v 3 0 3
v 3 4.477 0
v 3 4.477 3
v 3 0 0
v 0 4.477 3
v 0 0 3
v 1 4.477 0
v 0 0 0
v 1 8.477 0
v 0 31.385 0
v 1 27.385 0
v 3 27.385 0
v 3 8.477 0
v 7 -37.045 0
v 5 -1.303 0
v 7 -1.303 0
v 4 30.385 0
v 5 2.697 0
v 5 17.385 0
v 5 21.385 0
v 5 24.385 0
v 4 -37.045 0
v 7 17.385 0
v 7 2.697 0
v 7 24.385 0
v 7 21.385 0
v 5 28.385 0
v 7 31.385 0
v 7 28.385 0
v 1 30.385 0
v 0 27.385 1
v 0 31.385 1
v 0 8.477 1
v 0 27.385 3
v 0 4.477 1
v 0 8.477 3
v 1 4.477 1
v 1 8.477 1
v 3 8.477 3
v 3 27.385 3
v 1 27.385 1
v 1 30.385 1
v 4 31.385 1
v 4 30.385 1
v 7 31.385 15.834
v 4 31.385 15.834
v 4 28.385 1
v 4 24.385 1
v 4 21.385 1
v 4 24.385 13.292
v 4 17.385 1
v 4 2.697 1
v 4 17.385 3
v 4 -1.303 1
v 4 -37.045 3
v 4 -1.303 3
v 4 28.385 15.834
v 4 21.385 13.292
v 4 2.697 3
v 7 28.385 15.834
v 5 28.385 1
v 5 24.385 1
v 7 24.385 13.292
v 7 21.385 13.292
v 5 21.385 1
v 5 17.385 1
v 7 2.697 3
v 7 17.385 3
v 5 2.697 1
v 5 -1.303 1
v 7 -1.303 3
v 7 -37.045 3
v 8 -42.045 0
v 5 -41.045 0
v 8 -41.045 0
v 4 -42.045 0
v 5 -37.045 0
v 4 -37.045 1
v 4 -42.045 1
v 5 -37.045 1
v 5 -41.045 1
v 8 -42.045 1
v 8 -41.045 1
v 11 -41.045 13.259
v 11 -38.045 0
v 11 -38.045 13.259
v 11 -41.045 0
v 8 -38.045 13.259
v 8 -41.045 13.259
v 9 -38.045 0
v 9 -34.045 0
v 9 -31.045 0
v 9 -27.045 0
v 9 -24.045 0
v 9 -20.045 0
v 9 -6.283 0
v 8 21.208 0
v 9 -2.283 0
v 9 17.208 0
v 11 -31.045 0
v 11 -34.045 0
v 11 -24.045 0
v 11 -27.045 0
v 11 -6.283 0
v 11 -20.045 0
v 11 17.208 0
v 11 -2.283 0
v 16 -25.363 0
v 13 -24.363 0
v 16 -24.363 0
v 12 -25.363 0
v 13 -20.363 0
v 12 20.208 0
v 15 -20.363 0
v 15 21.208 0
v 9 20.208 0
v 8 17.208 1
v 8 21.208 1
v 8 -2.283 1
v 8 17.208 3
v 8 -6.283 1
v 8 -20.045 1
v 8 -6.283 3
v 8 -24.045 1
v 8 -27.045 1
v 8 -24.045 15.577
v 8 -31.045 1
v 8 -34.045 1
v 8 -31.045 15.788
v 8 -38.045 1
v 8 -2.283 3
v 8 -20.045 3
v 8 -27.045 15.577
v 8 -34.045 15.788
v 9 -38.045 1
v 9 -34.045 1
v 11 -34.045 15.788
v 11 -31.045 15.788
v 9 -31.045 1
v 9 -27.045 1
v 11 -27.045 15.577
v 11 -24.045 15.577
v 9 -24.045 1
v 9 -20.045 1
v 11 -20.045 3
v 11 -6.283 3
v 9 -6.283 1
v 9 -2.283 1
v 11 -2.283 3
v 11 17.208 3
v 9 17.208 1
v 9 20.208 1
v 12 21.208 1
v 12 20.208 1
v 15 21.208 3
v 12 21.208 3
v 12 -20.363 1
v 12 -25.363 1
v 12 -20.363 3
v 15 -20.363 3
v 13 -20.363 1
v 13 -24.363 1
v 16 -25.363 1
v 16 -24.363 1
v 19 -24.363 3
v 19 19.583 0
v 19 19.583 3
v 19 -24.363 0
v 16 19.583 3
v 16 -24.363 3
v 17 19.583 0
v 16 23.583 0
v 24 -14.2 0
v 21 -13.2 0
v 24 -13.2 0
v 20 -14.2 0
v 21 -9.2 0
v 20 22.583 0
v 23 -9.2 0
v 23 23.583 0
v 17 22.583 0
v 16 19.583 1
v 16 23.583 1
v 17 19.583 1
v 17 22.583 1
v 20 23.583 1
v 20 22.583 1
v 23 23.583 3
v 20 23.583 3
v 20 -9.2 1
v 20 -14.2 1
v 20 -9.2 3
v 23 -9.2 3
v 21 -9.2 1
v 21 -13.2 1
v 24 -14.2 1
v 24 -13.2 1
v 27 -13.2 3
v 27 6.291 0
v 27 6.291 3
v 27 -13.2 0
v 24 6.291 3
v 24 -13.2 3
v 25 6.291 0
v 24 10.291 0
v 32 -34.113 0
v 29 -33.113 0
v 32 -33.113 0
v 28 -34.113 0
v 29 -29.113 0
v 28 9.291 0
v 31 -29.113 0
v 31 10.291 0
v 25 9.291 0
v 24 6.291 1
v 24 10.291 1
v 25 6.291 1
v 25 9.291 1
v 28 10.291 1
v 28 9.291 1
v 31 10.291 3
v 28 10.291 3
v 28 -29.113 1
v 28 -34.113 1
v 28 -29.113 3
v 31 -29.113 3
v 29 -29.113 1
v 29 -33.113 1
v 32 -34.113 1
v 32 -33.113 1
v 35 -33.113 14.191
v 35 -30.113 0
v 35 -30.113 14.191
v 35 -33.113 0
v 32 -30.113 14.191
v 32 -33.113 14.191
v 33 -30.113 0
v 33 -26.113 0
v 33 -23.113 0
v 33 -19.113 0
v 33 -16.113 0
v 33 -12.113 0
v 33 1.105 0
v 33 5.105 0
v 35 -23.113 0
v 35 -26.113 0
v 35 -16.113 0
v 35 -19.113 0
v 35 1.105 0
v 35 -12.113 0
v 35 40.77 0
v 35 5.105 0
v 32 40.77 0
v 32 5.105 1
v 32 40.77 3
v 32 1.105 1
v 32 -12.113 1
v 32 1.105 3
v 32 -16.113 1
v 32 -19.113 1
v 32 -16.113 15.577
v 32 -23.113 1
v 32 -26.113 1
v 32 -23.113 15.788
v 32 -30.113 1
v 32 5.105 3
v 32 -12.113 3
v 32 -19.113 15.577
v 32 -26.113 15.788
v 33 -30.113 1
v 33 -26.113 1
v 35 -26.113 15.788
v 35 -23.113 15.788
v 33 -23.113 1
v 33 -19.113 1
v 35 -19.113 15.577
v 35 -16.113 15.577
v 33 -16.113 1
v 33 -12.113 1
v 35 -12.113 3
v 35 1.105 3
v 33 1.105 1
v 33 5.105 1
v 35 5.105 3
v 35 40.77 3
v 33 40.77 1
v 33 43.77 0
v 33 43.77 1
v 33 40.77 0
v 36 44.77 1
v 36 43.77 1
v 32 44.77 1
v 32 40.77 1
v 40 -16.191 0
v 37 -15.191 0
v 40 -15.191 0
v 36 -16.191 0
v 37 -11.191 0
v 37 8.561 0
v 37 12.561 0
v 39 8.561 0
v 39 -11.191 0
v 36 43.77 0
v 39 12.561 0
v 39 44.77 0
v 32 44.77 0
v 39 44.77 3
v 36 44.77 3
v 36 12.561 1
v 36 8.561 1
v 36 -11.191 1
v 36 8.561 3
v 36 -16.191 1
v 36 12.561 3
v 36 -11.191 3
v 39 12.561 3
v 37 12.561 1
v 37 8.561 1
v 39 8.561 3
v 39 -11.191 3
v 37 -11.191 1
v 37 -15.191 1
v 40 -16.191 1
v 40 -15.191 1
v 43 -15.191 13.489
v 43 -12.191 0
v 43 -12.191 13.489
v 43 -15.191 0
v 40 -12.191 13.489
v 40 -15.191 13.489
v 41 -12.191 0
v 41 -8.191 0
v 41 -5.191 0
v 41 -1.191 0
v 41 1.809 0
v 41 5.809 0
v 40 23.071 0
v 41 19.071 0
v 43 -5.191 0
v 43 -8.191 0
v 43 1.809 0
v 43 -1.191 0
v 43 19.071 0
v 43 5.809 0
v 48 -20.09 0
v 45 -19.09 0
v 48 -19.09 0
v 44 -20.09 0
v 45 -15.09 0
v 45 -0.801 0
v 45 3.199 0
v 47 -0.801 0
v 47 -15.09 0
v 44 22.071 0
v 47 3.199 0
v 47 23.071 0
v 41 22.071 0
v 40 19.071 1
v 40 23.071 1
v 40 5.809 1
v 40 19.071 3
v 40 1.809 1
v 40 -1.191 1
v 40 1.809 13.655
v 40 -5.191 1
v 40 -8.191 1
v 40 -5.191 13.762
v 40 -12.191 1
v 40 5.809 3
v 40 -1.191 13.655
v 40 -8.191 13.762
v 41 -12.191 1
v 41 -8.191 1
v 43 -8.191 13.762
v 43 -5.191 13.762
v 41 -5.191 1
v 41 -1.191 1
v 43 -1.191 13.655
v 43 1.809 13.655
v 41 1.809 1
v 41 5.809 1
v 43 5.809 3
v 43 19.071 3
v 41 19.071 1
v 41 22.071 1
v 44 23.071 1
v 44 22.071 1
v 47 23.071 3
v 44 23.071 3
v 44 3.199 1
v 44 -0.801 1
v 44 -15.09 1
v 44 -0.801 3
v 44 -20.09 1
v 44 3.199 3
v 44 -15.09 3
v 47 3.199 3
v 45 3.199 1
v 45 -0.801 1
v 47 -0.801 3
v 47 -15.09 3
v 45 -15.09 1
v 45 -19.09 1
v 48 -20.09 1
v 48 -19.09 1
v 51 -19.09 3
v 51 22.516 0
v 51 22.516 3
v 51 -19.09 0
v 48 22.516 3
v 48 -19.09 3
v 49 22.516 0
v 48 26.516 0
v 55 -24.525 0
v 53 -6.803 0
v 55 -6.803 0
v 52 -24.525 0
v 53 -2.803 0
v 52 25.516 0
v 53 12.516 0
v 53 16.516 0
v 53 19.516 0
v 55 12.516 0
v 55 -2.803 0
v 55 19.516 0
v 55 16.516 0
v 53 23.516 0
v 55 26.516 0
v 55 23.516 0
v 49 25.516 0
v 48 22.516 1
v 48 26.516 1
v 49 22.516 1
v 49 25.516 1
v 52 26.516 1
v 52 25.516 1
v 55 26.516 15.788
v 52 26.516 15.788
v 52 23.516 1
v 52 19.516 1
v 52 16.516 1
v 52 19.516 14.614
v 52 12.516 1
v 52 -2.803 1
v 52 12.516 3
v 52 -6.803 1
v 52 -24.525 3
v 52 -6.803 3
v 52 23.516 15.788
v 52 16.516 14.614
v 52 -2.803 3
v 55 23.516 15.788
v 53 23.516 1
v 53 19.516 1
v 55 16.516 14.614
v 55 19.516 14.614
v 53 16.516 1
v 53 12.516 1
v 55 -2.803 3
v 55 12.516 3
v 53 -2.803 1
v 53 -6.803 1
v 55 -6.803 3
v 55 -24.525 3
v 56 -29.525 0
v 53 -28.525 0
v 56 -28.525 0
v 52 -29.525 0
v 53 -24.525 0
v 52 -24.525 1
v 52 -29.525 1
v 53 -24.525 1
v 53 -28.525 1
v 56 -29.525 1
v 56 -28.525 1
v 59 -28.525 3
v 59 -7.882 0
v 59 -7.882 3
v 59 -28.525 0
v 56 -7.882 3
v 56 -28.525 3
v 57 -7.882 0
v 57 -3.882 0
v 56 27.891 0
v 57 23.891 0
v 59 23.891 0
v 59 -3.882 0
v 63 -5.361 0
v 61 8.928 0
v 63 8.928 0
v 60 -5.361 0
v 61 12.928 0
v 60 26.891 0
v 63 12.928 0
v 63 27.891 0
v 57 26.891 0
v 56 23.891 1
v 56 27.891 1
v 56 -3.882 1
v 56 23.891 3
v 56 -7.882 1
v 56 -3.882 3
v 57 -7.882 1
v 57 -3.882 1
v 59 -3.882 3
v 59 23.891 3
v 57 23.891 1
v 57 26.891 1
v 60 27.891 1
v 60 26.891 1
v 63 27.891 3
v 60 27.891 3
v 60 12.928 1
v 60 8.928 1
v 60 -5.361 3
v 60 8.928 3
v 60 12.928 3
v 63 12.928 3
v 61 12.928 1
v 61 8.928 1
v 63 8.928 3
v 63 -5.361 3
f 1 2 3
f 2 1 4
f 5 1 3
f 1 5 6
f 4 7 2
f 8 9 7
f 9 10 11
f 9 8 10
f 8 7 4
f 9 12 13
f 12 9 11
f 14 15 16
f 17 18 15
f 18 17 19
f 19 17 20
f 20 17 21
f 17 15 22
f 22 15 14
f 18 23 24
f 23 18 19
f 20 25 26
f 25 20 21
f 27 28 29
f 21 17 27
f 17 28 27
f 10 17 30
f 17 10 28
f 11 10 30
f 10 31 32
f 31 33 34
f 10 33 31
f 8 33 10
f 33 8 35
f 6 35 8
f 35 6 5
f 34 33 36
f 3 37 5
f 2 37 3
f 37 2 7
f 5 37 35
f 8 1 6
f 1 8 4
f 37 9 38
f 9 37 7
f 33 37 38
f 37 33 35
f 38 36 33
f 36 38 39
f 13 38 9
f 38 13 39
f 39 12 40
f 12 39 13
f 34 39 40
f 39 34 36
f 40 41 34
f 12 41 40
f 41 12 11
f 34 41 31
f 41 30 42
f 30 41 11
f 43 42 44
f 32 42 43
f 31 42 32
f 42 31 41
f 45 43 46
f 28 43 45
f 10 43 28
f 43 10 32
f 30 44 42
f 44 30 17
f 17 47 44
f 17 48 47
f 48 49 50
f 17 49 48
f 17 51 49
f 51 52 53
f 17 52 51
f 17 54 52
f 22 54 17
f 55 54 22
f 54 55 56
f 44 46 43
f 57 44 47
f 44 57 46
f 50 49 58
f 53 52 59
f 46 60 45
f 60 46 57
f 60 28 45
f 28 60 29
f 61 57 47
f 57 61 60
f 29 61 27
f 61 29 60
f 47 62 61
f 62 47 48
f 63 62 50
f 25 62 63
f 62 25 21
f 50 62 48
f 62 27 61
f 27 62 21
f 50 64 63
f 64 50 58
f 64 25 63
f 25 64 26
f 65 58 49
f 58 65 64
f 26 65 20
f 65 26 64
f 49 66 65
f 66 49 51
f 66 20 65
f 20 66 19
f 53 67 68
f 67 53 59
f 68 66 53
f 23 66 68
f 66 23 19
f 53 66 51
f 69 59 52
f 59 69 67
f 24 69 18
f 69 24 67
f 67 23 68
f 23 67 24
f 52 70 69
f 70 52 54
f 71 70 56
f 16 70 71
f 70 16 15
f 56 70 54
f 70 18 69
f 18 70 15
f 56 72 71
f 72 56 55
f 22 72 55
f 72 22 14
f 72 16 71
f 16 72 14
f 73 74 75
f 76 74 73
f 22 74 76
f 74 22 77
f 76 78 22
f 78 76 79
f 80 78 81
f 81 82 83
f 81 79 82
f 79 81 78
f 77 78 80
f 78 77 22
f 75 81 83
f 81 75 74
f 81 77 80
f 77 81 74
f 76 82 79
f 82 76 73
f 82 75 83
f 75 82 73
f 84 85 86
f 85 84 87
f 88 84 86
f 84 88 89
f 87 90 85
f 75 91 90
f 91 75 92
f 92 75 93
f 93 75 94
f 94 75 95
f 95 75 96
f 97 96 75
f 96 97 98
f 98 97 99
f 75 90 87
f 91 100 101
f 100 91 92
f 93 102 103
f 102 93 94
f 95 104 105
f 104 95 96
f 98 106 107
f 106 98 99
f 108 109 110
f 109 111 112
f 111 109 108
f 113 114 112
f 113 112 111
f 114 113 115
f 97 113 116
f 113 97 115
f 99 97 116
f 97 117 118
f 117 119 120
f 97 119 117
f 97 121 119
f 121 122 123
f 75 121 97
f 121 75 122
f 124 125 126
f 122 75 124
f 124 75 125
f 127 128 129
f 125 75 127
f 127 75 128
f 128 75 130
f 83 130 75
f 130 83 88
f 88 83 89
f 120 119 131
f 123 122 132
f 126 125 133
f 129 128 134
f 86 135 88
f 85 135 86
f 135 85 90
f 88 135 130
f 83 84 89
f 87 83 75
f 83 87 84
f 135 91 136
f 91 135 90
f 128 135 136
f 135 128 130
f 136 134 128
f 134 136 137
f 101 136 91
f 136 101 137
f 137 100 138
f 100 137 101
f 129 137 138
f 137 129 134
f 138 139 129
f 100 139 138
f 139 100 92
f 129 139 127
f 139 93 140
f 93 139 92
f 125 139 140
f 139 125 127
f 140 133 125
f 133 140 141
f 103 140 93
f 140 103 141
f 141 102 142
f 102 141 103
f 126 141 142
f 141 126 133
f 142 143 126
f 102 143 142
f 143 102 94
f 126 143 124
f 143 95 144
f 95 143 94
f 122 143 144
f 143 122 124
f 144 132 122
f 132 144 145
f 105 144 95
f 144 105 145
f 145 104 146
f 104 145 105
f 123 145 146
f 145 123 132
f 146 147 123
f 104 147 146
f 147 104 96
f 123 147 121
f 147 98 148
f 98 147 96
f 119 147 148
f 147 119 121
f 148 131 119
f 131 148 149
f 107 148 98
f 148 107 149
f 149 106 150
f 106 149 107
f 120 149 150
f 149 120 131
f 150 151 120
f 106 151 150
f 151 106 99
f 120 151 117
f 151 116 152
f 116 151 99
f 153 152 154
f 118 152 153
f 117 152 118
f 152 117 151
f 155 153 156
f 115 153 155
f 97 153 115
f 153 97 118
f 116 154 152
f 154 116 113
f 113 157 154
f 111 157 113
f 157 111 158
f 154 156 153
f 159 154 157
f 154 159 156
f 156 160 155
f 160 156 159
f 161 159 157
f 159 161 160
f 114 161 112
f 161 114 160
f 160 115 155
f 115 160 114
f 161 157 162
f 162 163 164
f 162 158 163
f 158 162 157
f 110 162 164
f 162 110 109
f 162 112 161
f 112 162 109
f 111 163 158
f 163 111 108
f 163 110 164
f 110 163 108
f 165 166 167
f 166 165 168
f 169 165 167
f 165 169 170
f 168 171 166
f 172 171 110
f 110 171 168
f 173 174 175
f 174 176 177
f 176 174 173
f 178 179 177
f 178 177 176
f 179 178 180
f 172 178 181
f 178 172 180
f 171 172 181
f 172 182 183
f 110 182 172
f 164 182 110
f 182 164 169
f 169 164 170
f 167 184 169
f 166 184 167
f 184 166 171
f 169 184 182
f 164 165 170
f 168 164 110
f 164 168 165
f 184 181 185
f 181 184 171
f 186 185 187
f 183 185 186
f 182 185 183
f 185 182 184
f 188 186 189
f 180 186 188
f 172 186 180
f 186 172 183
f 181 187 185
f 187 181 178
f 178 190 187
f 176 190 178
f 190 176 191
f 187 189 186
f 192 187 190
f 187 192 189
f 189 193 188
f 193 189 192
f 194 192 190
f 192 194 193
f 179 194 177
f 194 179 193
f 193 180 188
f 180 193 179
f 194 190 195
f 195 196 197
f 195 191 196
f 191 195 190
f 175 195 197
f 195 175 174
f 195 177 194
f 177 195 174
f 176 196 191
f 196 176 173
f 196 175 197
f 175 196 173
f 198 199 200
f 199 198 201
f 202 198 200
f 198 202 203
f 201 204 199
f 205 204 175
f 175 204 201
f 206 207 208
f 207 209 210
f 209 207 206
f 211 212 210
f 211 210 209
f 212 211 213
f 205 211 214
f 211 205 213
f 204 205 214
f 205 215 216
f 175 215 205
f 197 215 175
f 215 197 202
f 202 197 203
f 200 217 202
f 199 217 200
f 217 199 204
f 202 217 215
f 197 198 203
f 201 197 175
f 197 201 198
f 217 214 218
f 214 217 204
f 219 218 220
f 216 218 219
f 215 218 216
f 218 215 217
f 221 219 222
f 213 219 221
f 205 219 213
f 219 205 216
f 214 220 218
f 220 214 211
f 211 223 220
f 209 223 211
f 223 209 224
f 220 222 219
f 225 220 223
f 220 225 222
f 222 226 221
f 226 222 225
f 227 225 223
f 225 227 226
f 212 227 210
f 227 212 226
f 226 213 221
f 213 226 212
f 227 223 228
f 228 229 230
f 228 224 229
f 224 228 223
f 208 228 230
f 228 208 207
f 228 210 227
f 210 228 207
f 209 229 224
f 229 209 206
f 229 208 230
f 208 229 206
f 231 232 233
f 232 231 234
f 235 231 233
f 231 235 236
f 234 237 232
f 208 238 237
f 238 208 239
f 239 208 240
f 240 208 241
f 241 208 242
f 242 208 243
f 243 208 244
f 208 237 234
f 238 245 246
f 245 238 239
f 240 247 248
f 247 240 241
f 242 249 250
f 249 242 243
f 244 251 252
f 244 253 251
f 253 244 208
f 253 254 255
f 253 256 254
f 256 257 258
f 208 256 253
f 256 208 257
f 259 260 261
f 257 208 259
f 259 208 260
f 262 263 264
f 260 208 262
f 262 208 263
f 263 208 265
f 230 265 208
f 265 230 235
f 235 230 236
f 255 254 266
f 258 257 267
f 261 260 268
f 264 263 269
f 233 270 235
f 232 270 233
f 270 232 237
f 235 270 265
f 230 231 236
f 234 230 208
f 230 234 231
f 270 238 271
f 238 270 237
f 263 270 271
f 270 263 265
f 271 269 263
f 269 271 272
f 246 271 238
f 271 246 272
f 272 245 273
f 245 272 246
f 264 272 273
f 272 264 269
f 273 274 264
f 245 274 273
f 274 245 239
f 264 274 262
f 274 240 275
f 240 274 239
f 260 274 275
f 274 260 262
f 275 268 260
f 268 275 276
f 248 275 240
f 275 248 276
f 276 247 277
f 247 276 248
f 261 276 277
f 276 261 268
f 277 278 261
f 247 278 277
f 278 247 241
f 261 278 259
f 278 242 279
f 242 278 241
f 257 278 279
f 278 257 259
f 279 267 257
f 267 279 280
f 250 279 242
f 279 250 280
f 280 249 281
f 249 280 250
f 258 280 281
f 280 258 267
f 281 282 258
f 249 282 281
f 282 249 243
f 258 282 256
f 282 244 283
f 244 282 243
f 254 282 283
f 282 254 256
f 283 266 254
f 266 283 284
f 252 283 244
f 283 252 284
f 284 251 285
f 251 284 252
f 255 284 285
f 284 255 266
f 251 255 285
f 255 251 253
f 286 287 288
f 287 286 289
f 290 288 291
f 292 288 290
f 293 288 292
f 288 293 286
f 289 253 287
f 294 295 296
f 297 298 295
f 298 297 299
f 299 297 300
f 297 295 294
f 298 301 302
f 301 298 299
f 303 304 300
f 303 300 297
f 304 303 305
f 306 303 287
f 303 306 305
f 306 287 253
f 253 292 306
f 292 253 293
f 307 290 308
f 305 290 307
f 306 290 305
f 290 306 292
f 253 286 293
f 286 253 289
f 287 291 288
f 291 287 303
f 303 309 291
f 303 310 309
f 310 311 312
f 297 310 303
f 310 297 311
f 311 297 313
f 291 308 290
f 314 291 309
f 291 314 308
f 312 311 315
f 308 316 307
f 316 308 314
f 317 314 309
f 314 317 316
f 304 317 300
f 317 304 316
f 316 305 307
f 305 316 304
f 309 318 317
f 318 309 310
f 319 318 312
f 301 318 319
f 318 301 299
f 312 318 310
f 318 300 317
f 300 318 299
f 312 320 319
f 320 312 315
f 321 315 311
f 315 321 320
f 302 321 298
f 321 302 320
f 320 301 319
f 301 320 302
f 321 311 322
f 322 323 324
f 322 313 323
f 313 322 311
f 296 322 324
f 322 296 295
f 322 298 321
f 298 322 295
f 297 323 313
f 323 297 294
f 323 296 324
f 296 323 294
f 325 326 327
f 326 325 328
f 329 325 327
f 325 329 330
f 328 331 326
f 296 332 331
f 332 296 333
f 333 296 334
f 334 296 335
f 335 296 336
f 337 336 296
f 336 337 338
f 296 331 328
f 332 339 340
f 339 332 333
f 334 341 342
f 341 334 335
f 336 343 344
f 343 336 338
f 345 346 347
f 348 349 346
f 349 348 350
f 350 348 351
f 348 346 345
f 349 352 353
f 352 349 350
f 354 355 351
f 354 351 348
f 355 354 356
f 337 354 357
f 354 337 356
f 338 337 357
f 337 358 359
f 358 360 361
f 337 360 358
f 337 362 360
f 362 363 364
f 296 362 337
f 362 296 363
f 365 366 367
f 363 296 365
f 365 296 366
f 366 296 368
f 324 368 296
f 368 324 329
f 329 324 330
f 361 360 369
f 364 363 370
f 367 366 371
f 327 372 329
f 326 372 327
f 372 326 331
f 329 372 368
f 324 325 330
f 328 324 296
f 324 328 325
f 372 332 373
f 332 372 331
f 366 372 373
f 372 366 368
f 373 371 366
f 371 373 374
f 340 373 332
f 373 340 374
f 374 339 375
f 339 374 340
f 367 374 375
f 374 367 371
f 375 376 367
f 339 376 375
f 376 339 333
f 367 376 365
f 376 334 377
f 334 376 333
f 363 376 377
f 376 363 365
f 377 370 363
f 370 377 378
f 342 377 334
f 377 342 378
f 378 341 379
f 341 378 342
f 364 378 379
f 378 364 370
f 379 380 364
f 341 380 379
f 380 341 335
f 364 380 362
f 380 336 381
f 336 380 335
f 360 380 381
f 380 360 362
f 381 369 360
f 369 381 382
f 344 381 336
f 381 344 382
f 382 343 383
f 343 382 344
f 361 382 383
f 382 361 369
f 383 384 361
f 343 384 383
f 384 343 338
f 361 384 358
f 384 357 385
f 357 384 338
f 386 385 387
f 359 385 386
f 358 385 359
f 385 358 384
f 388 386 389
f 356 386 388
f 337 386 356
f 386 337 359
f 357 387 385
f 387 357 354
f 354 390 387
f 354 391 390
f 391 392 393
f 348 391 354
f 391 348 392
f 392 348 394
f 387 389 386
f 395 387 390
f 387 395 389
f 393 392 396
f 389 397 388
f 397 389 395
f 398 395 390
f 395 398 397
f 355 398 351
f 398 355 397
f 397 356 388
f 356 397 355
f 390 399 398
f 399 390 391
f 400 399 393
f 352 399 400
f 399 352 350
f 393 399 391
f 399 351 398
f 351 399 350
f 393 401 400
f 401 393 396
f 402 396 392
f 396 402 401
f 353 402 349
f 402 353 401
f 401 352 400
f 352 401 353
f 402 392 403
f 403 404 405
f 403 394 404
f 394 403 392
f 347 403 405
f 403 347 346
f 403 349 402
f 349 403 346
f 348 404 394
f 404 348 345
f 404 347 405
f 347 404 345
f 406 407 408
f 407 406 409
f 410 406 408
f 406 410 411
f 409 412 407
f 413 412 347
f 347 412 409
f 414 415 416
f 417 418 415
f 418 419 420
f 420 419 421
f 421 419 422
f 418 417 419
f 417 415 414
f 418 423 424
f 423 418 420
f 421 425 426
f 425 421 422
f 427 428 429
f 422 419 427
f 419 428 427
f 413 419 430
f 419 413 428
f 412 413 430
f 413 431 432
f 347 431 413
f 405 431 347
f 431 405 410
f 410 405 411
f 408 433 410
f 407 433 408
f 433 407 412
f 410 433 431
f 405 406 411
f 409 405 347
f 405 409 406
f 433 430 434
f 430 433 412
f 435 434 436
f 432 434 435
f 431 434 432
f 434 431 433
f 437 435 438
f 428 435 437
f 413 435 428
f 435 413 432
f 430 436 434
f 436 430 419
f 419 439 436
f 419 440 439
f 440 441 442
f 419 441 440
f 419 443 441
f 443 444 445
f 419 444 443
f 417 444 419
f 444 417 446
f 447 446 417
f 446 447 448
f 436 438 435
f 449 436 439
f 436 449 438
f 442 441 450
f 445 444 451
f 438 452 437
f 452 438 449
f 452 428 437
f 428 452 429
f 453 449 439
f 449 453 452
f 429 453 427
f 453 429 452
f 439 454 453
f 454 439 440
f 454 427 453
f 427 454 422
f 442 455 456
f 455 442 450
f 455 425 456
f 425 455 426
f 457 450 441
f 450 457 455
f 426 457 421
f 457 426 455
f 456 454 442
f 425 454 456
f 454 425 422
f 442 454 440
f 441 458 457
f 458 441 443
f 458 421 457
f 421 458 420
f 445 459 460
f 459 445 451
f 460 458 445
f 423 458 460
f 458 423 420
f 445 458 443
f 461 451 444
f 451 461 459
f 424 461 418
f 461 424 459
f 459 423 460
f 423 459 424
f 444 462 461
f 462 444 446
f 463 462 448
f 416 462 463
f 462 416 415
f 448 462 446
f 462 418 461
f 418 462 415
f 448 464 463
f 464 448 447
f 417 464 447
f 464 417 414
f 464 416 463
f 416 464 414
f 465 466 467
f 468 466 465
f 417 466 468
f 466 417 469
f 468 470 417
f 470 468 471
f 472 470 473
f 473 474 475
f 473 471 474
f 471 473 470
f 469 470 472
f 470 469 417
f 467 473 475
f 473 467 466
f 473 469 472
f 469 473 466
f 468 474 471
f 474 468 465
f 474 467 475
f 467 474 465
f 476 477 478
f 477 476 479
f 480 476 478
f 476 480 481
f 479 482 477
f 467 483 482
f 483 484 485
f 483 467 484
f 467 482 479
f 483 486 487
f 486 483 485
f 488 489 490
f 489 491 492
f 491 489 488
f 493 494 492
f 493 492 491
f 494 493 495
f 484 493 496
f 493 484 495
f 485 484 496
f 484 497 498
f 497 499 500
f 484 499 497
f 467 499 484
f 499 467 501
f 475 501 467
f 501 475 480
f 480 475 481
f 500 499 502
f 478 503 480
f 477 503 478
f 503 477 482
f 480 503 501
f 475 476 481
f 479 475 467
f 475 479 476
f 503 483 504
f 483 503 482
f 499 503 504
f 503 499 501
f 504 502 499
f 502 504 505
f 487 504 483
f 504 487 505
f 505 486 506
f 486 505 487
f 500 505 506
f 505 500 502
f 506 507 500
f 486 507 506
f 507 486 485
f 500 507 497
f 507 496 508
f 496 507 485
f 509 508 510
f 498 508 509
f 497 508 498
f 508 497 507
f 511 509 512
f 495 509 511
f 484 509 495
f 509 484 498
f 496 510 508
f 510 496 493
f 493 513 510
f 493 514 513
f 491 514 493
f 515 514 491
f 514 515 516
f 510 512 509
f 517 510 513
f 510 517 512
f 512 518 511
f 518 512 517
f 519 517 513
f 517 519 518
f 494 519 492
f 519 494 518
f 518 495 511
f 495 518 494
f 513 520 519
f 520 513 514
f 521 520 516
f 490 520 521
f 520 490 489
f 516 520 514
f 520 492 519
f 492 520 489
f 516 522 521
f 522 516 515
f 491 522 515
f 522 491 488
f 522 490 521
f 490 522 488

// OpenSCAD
translate([0.000000, 0.000000, 0]) rotate([0,0.000000,0]) cube([3.000000, 4.477220, 3.000000]);translate([0.000000, 4.477220, 0]) rotate([0,0,0]) cube([1.000000, 4.000000, 1.000000]);translate([0.000000, 8.477220, 0]) rotate([0,0.000000,0]) cube([3.000000, 18.907636, 3.000000]);translate([0.000000, 27.384856, 0]) rotate([0,0,0]) cube([1.000000, 4.000000, 1.000000]);translate([0.000000, 31.384856, 0]) rotate([0,0,-90]) cube([1.000000, 4.000000, 1.000000]);translate([7.000000, 31.384856, 0.000000]) rotate([180, 180.000000 ,0]) cube([3.000000, 3.000000, 15.833687]);translate([0.000000, 27.384856, 0]) rotate([0,0,0]) cube([1.000000, 4.000000, 1.000000]);translate([4.000000, 28.384856, 1.000000]) rotate([180, 0, 0]) cube([1.000000, 4.000000, 1.000000]);translate([7.000000, 24.384856, 0.000000]) rotate([180, 180.000000 ,0]) cube([3.000000, 3.000000, 13.291805]);translate([0.000000, 27.384856, 0]) rotate([0,0,0]) cube([1.000000, 4.000000, 1.000000]);translate([4.000000, 28.384856, 1.000000]) rotate([180, 0, 0]) cube([1.000000, 4.000000, 1.000000]);translate([4.000000, 21.384856, 1.000000]) rotate([180, 0, 0]) cube([1.000000, 4.000000, 1.000000]);translate([4.000000, 17.384856, 3.000000]) rotate([180, 0.000000 ,0]) cube([3.000000, 14.688103, 3.000000]);translate([0.000000, 27.384856, 0]) rotate([0,0,0]) cube([1.000000, 4.000000, 1.000000]);translate([4.000000, 28.384856, 1.000000]) rotate([180, 0, 0]) cube([1.000000, 4.000000, 1.000000]);translate([4.000000, 21.384856, 1.000000]) rotate([180, 0, 0]) cube([1.000000, 4.000000, 1.000000]);translate([4.000000, 2.696753, 1.000000]) rotate([180, 0, 0]) cube([1.000000, 4.000000, 1.000000]);translate([4.000000, -1.303247, 3.000000]) rotate([180, 0.000000 ,0]) cube([3.000000, 35.741387, 3.000000]);translate([0.000000, 27.384856, 0]) rotate([0,0,0]) cube([1.000000, 4.000000, 1.000000]);translate([4.000000, 28.384856, 1.000000]) rotate([180, 0, 0]) cube([1.000000, 4.000000, 1.000000]);translate([4.000000, 21.384856, 1.000000]) rotate([180, 0, 0]) cube([1.000000, 4.000000, 1.000000]);translate([4.000000, 2.696753, 1.000000]) rotate([180, 0, 0]) cube([1.000000, 4.000000, 1.000000]);translate([4.000000, -37.044635, 1.000000]) rotate([180, 0, 0]) cube([1.000000, 4.000000, 1.000000]);translate([4.000000, -41.044635, 0]) rotate([0,0,-90]) cube([1.000000, 4.000000, 1.000000]);translate([8.000000, -41.044635, 0]) rotate([0,0.000000,0]) cube([3.000000, 3.000000, 13.258750]);translate([8.000000, -38.044635, 0]) rotate([0,0,0]) cube([1.000000, 4.000000, 1.000000]);translate([8.000000, -34.044635, 0]) rotate([0,0.000000,0]) cube([3.000000, 3.000000, 15.787946]);translate([8.000000, -31.044635, 0]) rotate([0,0,0]) cube([1.000000, 4.000000, 1.000000]);translate([8.000000, -27.044635, 0]) rotate([0,0.000000,0]) cube([3.000000, 3.000000, 15.577183]);translate([8.000000, -24.044635, 0]) rotate([0,0,0]) cube([1.000000, 4.000000, 1.000000]);translate([8.000000, -20.044635, 0]) rotate([0,0.000000,0]) cube([3.000000, 13.762133, 3.000000]);translate([8.000000, -6.282502, 0]) rotate([0,0,0]) cube([1.000000, 4.000000, 1.000000]);translate([8.000000, -2.282502, 0]) rotate([0,0.000000,0]) cube([3.000000, 19.490858, 3.000000]);translate([8.000000, 17.208356, 0]) rotate([0,0,0]) cube([1.000000, 4.000000, 1.000000]);translate([8.000000, 21.208356, 0]) rotate([0,0,-90]) cube([1.000000, 4.000000, 1.000000]);translate([12.000000, 21.208356, 3.000000]) rotate([180, 0.000000 ,0]) cube([3.000000, 41.571593, 3.000000]);translate([8.000000, 17.208356, 0]) rotate([0,0,0]) cube([1.000000, 4.000000, 1.000000]);translate([12.000000, -20.363237, 1.000000]) rotate([180, 0, 0]) cube([1.000000, 4.000000, 1.000000]);translate([12.000000, -24.363237, 0]) rotate([0,0,-90]) cube([1.000000, 4.000000, 1.000000]);translate([16.000000, -24.363237, 0]) rotate([0,0.000000,0]) cube([3.000000, 43.945840, 3.000000]);translate([16.000000, 19.582603, 0]) rotate([0,0,0]) cube([1.000000, 4.000000, 1.000000]);translate([16.000000, 23.582603, 0]) rotate([0,0,-90]) cube([1.000000, 4.000000, 1.000000]);translate([20.000000, 23.582603, 3.000000]) rotate([180, 0.000000 ,0]) cube([3.000000, 32.782151, 3.000000]);translate([16.000000, 19.582603, 0]) rotate([0,0,0]) cube([1.000000, 4.000000, 1.000000]);translate([20.000000, -9.199548, 1.000000]) rotate([180, 0, 0]) cube([1.000000, 4.000000, 1.000000]);translate([20.000000, -13.199548, 0]) rotate([0,0,-90]) cube([1.000000, 4.000000, 1.000000]);translate([24.000000, -13.199548, 0]) rotate([0,0.000000,0]) cube([3.000000, 19.490858, 3.000000]);translate([24.000000, 6.291310, 0]) rotate([0,0,0]) cube([1.000000, 4.000000, 1.000000]);translate([24.000000, 10.291310, 0]) rotate([0,0,-90]) cube([1.000000, 4.000000, 1.000000]);translate([28.000000, 10.291310, 3.000000]) rotate([180, 0.000000 ,0]) cube([3.000000, 39.404039, 3.000000]);translate([24.000000, 6.291310, 0]) rotate([0,0,0]) cube([1.000000, 4.000000, 1.000000]);translate([28.000000, -29.112729, 1.000000]) rotate([180, 0, 0]) cube([1.000000, 4.000000, 1.000000]);translate([28.000000, -33.112729, 0]) rotate([0,0,-90]) cube([1.000000, 4.000000, 1.000000]);translate([32.000000, -33.112729, 0]) rotate([0,0.000000,0]) cube([3.000000, 3.000000, 14.190911]);translate([32.000000, -30.112729, 0]) rotate([0,0,0]) cube([1.000000, 4.000000, 1.000000]);translate([32.000000, -26.112729, 0]) rotate([0,0.000000,0]) cube([3.000000, 3.000000, 15.787946]);translate([32.000000, -23.112729, 0]) rotate([0,0,0]) cube([1.000000, 4.000000, 1.000000]);translate([32.000000, -19.112729, 0]) rotate([0,0.000000,0]) cube([3.000000, 3.000000, 15.577183]);translate([32.000000, -16.112729, 0]) rotate([0,0,0]) cube([1.000000, 4.000000, 1.000000]);translate([32.000000, -12.112729, 0]) rotate([0,0.000000,0]) cube([3.000000, 13.217342, 3.000000]);translate([32.000000, 1.104612, 0]) rotate([0,0,0]) cube([1.000000, 4.000000, 1.000000]);translate([32.000000, 5.104612, 0]) rotate([0,0.000000,0]) cube([3.000000, 35.665136, 3.000000]);translate([32.000000, 40.769749, 0]) rotate([0,0,0]) cube([1.000000, 4.000000, 1.000000]);translate([32.000000, 44.769749, 0]) rotate([0,0,-90]) cube([1.000000, 4.000000, 1.000000]);translate([36.000000, 44.769749, 3.000000]) rotate([180, 0.000000 ,0]) cube([3.000000, 32.208775, 3.000000]);translate([32.000000, 40.769749, 0]) rotate([0,0,0]) cube([1.000000, 4.000000, 1.000000]);translate([36.000000, 12.560974, 1.000000]) rotate([180, 0, 0]) cube([1.000000, 4.000000, 1.000000]);translate([36.000000, 8.560974, 3.000000]) rotate([180, 0.000000 ,0]) cube([3.000000, 19.752030, 3.000000]);translate([32.000000, 40.769749, 0]) rotate([0,0,0]) cube([1.000000, 4.000000, 1.000000]);translate([36.000000, 12.560974, 1.000000]) rotate([180, 0, 0]) cube([1.000000, 4.000000, 1.000000]);translate([36.000000, -11.191056, 1.000000]) rotate([180, 0, 0]) cube([1.000000, 4.000000, 1.000000]);translate([36.000000, -15.191056, 0]) rotate([0,0,-90]) cube([1.000000, 4.000000, 1.000000]);translate([40.000000, -15.191056, 0]) rotate([0,0.000000,0]) cube([3.000000, 3.000000, 13.488634]);translate([40.000000, -12.191056, 0]) rotate([0,0,0]) cube([1.000000, 4.000000, 1.000000]);translate([40.000000, -8.191056, 0]) rotate([0,0.000000,0]) cube([3.000000, 3.000000, 13.761956]);translate([40.000000, -5.191056, 0]) rotate([0,0,0]) cube([1.000000, 4.000000, 1.000000]);translate([40.000000, -1.191056, 0]) rotate([0,0.000000,0]) cube([3.000000, 3.000000, 13.654967]);translate([40.000000, 1.808944, 0]) rotate([0,0,0]) cube([1.000000, 4.000000, 1.000000]);translate([40.000000, 5.808944, 0]) rotate([0,0.000000,0]) cube([3.000000, 13.261866, 3.000000]);translate([40.000000, 19.070810, 0]) rotate([0,0,0]) cube([1.000000, 4.000000, 1.000000]);translate([40.000000, 23.070810, 0]) rotate([0,0,-90]) cube([1.000000, 4.000000, 1.000000]);translate([44.000000, 23.070810, 3.000000]) rotate([180, 0.000000 ,0]) cube([3.000000, 19.871684, 3.000000]);translate([40.000000, 19.070810, 0]) rotate([0,0,0]) cube([1.000000, 4.000000, 1.000000]);translate([44.000000, 3.199126, 1.000000]) rotate([180, 0, 0]) cube([1.000000, 4.000000, 1.000000]);translate([44.000000, -0.800874, 3.000000]) rotate([180, 0.000000 ,0]) cube([3.000000, 14.289388, 3.000000]);translate([40.000000, 19.070810, 0]) rotate([0,0,0]) cube([1.000000, 4.000000, 1.000000]);translate([44.000000, 3.199126, 1.000000]) rotate([180, 0, 0]) cube([1.000000, 4.000000, 1.000000]);translate([44.000000, -15.090262, 1.000000]) rotate([180, 0, 0]) cube([1.000000, 4.000000, 1.000000]);translate([44.000000, -19.090262, 0]) rotate([0,0,-90]) cube([1.000000, 4.000000, 1.000000]);translate([48.000000, -19.090262, 0]) rotate([0,0.000000,0]) cube([3.000000, 41.606259, 3.000000]);translate([48.000000, 22.515997, 0]) rotate([0,0,0]) cube([1.000000, 4.000000, 1.000000]);translate([48.000000, 26.515997, 0]) rotate([0,0,-90]) cube([1.000000, 4.000000, 1.000000]);translate([55.000000, 26.515997, 0.000000]) rotate([180, 180.000000 ,0]) cube([3.000000, 3.000000, 15.787946]);translate([48.000000, 22.515997, 0]) rotate([0,0,0]) cube([1.000000, 4.000000, 1.000000]);translate([52.000000, 23.515997, 1.000000]) rotate([180, 0, 0]) cube([1.000000, 4.000000, 1.000000]);translate([55.000000, 19.515997, 0.000000]) rotate([180, 180.000000 ,0]) cube([3.000000, 3.000000, 14.613882]);translate([48.000000, 22.515997, 0]) rotate([0,0,0]) cube([1.000000, 4.000000, 1.000000]);translate([52.000000, 23.515997, 1.000000]) rotate([180, 0, 0]) cube([1.000000, 4.000000, 1.000000]);translate([52.000000, 16.515997, 1.000000]) rotate([180, 0, 0]) cube([1.000000, 4.000000, 1.000000]);translate([52.000000, 12.515997, 3.000000]) rotate([180, 0.000000 ,0]) cube([3.000000, 15.318572, 3.000000]);translate([48.000000, 22.515997, 0]) rotate([0,0,0]) cube([1.000000, 4.000000, 1.000000]);translate([52.000000, 23.515997, 1.000000]) rotate([180, 0, 0]) cube([1.000000, 4.000000, 1.000000]);translate([52.000000, 16.515997, 1.000000]) rotate([180, 0, 0]) cube([1.000000, 4.000000, 1.000000]);translate([52.000000, -2.802575, 1.000000]) rotate([180, 0, 0]) cube([1.000000, 4.000000, 1.000000]);translate([52.000000, -6.802575, 3.000000]) rotate([180, 0.000000 ,0]) cube([3.000000, 17.722367, 3.000000]);translate([48.000000, 22.515997, 0]) rotate([0,0,0]) cube([1.000000, 4.000000, 1.000000]);translate([52.000000, 23.515997, 1.000000]) rotate([180, 0, 0]) cube([1.000000, 4.000000, 1.000000]);translate([52.000000, 16.515997, 1.000000]) rotate([180, 0, 0]) cube([1.000000, 4.000000, 1.000000]);translate([52.000000, -2.802575, 1.000000]) rotate([180, 0, 0]) cube([1.000000, 4.000000, 1.000000]);translate([52.000000, -24.524943, 1.000000]) rotate([180, 0, 0]) cube([1.000000, 4.000000, 1.000000]);translate([52.000000, -28.524943, 0]) rotate([0,0,-90]) cube([1.000000, 4.000000, 1.000000]);translate([56.000000, -28.524943, 0]) rotate([0,0.000000,0]) cube([3.000000, 20.643333, 3.000000]);translate([56.000000, -7.881610, 0]) rotate([0,0,0]) cube([1.000000, 4.000000, 1.000000]);translate([56.000000, -3.881610, 0]) rotate([0,0.000000,0]) cube([3.000000, 27.772375, 3.000000]);translate([56.000000, 23.890765, 0]) rotate([0,0,0]) cube([1.000000, 4.000000, 1.000000]);translate([56.000000, 27.890765, 0]) rotate([0,0,-90]) cube([1.000000, 4.000000, 1.000000]);translate([60.000000, 27.890765, 3.000000]) rotate([180, 0.000000 ,0]) cube([3.000000, 14.962388, 3.000000]);translate([56.000000, 23.890765, 0]) rotate([0,0,0]) cube([1.000000, 4.000000, 1.000000]);translate([60.000000, 12.928377, 1.000000]) rotate([180, 0, 0]) cube([1.000000, 4.000000, 1.000000]);translate([60.000000, 8.928377, 3.000000]) rotate([180, 0.000000 ,0]) cube([3.000000, 14.289388, 3.000000]);
